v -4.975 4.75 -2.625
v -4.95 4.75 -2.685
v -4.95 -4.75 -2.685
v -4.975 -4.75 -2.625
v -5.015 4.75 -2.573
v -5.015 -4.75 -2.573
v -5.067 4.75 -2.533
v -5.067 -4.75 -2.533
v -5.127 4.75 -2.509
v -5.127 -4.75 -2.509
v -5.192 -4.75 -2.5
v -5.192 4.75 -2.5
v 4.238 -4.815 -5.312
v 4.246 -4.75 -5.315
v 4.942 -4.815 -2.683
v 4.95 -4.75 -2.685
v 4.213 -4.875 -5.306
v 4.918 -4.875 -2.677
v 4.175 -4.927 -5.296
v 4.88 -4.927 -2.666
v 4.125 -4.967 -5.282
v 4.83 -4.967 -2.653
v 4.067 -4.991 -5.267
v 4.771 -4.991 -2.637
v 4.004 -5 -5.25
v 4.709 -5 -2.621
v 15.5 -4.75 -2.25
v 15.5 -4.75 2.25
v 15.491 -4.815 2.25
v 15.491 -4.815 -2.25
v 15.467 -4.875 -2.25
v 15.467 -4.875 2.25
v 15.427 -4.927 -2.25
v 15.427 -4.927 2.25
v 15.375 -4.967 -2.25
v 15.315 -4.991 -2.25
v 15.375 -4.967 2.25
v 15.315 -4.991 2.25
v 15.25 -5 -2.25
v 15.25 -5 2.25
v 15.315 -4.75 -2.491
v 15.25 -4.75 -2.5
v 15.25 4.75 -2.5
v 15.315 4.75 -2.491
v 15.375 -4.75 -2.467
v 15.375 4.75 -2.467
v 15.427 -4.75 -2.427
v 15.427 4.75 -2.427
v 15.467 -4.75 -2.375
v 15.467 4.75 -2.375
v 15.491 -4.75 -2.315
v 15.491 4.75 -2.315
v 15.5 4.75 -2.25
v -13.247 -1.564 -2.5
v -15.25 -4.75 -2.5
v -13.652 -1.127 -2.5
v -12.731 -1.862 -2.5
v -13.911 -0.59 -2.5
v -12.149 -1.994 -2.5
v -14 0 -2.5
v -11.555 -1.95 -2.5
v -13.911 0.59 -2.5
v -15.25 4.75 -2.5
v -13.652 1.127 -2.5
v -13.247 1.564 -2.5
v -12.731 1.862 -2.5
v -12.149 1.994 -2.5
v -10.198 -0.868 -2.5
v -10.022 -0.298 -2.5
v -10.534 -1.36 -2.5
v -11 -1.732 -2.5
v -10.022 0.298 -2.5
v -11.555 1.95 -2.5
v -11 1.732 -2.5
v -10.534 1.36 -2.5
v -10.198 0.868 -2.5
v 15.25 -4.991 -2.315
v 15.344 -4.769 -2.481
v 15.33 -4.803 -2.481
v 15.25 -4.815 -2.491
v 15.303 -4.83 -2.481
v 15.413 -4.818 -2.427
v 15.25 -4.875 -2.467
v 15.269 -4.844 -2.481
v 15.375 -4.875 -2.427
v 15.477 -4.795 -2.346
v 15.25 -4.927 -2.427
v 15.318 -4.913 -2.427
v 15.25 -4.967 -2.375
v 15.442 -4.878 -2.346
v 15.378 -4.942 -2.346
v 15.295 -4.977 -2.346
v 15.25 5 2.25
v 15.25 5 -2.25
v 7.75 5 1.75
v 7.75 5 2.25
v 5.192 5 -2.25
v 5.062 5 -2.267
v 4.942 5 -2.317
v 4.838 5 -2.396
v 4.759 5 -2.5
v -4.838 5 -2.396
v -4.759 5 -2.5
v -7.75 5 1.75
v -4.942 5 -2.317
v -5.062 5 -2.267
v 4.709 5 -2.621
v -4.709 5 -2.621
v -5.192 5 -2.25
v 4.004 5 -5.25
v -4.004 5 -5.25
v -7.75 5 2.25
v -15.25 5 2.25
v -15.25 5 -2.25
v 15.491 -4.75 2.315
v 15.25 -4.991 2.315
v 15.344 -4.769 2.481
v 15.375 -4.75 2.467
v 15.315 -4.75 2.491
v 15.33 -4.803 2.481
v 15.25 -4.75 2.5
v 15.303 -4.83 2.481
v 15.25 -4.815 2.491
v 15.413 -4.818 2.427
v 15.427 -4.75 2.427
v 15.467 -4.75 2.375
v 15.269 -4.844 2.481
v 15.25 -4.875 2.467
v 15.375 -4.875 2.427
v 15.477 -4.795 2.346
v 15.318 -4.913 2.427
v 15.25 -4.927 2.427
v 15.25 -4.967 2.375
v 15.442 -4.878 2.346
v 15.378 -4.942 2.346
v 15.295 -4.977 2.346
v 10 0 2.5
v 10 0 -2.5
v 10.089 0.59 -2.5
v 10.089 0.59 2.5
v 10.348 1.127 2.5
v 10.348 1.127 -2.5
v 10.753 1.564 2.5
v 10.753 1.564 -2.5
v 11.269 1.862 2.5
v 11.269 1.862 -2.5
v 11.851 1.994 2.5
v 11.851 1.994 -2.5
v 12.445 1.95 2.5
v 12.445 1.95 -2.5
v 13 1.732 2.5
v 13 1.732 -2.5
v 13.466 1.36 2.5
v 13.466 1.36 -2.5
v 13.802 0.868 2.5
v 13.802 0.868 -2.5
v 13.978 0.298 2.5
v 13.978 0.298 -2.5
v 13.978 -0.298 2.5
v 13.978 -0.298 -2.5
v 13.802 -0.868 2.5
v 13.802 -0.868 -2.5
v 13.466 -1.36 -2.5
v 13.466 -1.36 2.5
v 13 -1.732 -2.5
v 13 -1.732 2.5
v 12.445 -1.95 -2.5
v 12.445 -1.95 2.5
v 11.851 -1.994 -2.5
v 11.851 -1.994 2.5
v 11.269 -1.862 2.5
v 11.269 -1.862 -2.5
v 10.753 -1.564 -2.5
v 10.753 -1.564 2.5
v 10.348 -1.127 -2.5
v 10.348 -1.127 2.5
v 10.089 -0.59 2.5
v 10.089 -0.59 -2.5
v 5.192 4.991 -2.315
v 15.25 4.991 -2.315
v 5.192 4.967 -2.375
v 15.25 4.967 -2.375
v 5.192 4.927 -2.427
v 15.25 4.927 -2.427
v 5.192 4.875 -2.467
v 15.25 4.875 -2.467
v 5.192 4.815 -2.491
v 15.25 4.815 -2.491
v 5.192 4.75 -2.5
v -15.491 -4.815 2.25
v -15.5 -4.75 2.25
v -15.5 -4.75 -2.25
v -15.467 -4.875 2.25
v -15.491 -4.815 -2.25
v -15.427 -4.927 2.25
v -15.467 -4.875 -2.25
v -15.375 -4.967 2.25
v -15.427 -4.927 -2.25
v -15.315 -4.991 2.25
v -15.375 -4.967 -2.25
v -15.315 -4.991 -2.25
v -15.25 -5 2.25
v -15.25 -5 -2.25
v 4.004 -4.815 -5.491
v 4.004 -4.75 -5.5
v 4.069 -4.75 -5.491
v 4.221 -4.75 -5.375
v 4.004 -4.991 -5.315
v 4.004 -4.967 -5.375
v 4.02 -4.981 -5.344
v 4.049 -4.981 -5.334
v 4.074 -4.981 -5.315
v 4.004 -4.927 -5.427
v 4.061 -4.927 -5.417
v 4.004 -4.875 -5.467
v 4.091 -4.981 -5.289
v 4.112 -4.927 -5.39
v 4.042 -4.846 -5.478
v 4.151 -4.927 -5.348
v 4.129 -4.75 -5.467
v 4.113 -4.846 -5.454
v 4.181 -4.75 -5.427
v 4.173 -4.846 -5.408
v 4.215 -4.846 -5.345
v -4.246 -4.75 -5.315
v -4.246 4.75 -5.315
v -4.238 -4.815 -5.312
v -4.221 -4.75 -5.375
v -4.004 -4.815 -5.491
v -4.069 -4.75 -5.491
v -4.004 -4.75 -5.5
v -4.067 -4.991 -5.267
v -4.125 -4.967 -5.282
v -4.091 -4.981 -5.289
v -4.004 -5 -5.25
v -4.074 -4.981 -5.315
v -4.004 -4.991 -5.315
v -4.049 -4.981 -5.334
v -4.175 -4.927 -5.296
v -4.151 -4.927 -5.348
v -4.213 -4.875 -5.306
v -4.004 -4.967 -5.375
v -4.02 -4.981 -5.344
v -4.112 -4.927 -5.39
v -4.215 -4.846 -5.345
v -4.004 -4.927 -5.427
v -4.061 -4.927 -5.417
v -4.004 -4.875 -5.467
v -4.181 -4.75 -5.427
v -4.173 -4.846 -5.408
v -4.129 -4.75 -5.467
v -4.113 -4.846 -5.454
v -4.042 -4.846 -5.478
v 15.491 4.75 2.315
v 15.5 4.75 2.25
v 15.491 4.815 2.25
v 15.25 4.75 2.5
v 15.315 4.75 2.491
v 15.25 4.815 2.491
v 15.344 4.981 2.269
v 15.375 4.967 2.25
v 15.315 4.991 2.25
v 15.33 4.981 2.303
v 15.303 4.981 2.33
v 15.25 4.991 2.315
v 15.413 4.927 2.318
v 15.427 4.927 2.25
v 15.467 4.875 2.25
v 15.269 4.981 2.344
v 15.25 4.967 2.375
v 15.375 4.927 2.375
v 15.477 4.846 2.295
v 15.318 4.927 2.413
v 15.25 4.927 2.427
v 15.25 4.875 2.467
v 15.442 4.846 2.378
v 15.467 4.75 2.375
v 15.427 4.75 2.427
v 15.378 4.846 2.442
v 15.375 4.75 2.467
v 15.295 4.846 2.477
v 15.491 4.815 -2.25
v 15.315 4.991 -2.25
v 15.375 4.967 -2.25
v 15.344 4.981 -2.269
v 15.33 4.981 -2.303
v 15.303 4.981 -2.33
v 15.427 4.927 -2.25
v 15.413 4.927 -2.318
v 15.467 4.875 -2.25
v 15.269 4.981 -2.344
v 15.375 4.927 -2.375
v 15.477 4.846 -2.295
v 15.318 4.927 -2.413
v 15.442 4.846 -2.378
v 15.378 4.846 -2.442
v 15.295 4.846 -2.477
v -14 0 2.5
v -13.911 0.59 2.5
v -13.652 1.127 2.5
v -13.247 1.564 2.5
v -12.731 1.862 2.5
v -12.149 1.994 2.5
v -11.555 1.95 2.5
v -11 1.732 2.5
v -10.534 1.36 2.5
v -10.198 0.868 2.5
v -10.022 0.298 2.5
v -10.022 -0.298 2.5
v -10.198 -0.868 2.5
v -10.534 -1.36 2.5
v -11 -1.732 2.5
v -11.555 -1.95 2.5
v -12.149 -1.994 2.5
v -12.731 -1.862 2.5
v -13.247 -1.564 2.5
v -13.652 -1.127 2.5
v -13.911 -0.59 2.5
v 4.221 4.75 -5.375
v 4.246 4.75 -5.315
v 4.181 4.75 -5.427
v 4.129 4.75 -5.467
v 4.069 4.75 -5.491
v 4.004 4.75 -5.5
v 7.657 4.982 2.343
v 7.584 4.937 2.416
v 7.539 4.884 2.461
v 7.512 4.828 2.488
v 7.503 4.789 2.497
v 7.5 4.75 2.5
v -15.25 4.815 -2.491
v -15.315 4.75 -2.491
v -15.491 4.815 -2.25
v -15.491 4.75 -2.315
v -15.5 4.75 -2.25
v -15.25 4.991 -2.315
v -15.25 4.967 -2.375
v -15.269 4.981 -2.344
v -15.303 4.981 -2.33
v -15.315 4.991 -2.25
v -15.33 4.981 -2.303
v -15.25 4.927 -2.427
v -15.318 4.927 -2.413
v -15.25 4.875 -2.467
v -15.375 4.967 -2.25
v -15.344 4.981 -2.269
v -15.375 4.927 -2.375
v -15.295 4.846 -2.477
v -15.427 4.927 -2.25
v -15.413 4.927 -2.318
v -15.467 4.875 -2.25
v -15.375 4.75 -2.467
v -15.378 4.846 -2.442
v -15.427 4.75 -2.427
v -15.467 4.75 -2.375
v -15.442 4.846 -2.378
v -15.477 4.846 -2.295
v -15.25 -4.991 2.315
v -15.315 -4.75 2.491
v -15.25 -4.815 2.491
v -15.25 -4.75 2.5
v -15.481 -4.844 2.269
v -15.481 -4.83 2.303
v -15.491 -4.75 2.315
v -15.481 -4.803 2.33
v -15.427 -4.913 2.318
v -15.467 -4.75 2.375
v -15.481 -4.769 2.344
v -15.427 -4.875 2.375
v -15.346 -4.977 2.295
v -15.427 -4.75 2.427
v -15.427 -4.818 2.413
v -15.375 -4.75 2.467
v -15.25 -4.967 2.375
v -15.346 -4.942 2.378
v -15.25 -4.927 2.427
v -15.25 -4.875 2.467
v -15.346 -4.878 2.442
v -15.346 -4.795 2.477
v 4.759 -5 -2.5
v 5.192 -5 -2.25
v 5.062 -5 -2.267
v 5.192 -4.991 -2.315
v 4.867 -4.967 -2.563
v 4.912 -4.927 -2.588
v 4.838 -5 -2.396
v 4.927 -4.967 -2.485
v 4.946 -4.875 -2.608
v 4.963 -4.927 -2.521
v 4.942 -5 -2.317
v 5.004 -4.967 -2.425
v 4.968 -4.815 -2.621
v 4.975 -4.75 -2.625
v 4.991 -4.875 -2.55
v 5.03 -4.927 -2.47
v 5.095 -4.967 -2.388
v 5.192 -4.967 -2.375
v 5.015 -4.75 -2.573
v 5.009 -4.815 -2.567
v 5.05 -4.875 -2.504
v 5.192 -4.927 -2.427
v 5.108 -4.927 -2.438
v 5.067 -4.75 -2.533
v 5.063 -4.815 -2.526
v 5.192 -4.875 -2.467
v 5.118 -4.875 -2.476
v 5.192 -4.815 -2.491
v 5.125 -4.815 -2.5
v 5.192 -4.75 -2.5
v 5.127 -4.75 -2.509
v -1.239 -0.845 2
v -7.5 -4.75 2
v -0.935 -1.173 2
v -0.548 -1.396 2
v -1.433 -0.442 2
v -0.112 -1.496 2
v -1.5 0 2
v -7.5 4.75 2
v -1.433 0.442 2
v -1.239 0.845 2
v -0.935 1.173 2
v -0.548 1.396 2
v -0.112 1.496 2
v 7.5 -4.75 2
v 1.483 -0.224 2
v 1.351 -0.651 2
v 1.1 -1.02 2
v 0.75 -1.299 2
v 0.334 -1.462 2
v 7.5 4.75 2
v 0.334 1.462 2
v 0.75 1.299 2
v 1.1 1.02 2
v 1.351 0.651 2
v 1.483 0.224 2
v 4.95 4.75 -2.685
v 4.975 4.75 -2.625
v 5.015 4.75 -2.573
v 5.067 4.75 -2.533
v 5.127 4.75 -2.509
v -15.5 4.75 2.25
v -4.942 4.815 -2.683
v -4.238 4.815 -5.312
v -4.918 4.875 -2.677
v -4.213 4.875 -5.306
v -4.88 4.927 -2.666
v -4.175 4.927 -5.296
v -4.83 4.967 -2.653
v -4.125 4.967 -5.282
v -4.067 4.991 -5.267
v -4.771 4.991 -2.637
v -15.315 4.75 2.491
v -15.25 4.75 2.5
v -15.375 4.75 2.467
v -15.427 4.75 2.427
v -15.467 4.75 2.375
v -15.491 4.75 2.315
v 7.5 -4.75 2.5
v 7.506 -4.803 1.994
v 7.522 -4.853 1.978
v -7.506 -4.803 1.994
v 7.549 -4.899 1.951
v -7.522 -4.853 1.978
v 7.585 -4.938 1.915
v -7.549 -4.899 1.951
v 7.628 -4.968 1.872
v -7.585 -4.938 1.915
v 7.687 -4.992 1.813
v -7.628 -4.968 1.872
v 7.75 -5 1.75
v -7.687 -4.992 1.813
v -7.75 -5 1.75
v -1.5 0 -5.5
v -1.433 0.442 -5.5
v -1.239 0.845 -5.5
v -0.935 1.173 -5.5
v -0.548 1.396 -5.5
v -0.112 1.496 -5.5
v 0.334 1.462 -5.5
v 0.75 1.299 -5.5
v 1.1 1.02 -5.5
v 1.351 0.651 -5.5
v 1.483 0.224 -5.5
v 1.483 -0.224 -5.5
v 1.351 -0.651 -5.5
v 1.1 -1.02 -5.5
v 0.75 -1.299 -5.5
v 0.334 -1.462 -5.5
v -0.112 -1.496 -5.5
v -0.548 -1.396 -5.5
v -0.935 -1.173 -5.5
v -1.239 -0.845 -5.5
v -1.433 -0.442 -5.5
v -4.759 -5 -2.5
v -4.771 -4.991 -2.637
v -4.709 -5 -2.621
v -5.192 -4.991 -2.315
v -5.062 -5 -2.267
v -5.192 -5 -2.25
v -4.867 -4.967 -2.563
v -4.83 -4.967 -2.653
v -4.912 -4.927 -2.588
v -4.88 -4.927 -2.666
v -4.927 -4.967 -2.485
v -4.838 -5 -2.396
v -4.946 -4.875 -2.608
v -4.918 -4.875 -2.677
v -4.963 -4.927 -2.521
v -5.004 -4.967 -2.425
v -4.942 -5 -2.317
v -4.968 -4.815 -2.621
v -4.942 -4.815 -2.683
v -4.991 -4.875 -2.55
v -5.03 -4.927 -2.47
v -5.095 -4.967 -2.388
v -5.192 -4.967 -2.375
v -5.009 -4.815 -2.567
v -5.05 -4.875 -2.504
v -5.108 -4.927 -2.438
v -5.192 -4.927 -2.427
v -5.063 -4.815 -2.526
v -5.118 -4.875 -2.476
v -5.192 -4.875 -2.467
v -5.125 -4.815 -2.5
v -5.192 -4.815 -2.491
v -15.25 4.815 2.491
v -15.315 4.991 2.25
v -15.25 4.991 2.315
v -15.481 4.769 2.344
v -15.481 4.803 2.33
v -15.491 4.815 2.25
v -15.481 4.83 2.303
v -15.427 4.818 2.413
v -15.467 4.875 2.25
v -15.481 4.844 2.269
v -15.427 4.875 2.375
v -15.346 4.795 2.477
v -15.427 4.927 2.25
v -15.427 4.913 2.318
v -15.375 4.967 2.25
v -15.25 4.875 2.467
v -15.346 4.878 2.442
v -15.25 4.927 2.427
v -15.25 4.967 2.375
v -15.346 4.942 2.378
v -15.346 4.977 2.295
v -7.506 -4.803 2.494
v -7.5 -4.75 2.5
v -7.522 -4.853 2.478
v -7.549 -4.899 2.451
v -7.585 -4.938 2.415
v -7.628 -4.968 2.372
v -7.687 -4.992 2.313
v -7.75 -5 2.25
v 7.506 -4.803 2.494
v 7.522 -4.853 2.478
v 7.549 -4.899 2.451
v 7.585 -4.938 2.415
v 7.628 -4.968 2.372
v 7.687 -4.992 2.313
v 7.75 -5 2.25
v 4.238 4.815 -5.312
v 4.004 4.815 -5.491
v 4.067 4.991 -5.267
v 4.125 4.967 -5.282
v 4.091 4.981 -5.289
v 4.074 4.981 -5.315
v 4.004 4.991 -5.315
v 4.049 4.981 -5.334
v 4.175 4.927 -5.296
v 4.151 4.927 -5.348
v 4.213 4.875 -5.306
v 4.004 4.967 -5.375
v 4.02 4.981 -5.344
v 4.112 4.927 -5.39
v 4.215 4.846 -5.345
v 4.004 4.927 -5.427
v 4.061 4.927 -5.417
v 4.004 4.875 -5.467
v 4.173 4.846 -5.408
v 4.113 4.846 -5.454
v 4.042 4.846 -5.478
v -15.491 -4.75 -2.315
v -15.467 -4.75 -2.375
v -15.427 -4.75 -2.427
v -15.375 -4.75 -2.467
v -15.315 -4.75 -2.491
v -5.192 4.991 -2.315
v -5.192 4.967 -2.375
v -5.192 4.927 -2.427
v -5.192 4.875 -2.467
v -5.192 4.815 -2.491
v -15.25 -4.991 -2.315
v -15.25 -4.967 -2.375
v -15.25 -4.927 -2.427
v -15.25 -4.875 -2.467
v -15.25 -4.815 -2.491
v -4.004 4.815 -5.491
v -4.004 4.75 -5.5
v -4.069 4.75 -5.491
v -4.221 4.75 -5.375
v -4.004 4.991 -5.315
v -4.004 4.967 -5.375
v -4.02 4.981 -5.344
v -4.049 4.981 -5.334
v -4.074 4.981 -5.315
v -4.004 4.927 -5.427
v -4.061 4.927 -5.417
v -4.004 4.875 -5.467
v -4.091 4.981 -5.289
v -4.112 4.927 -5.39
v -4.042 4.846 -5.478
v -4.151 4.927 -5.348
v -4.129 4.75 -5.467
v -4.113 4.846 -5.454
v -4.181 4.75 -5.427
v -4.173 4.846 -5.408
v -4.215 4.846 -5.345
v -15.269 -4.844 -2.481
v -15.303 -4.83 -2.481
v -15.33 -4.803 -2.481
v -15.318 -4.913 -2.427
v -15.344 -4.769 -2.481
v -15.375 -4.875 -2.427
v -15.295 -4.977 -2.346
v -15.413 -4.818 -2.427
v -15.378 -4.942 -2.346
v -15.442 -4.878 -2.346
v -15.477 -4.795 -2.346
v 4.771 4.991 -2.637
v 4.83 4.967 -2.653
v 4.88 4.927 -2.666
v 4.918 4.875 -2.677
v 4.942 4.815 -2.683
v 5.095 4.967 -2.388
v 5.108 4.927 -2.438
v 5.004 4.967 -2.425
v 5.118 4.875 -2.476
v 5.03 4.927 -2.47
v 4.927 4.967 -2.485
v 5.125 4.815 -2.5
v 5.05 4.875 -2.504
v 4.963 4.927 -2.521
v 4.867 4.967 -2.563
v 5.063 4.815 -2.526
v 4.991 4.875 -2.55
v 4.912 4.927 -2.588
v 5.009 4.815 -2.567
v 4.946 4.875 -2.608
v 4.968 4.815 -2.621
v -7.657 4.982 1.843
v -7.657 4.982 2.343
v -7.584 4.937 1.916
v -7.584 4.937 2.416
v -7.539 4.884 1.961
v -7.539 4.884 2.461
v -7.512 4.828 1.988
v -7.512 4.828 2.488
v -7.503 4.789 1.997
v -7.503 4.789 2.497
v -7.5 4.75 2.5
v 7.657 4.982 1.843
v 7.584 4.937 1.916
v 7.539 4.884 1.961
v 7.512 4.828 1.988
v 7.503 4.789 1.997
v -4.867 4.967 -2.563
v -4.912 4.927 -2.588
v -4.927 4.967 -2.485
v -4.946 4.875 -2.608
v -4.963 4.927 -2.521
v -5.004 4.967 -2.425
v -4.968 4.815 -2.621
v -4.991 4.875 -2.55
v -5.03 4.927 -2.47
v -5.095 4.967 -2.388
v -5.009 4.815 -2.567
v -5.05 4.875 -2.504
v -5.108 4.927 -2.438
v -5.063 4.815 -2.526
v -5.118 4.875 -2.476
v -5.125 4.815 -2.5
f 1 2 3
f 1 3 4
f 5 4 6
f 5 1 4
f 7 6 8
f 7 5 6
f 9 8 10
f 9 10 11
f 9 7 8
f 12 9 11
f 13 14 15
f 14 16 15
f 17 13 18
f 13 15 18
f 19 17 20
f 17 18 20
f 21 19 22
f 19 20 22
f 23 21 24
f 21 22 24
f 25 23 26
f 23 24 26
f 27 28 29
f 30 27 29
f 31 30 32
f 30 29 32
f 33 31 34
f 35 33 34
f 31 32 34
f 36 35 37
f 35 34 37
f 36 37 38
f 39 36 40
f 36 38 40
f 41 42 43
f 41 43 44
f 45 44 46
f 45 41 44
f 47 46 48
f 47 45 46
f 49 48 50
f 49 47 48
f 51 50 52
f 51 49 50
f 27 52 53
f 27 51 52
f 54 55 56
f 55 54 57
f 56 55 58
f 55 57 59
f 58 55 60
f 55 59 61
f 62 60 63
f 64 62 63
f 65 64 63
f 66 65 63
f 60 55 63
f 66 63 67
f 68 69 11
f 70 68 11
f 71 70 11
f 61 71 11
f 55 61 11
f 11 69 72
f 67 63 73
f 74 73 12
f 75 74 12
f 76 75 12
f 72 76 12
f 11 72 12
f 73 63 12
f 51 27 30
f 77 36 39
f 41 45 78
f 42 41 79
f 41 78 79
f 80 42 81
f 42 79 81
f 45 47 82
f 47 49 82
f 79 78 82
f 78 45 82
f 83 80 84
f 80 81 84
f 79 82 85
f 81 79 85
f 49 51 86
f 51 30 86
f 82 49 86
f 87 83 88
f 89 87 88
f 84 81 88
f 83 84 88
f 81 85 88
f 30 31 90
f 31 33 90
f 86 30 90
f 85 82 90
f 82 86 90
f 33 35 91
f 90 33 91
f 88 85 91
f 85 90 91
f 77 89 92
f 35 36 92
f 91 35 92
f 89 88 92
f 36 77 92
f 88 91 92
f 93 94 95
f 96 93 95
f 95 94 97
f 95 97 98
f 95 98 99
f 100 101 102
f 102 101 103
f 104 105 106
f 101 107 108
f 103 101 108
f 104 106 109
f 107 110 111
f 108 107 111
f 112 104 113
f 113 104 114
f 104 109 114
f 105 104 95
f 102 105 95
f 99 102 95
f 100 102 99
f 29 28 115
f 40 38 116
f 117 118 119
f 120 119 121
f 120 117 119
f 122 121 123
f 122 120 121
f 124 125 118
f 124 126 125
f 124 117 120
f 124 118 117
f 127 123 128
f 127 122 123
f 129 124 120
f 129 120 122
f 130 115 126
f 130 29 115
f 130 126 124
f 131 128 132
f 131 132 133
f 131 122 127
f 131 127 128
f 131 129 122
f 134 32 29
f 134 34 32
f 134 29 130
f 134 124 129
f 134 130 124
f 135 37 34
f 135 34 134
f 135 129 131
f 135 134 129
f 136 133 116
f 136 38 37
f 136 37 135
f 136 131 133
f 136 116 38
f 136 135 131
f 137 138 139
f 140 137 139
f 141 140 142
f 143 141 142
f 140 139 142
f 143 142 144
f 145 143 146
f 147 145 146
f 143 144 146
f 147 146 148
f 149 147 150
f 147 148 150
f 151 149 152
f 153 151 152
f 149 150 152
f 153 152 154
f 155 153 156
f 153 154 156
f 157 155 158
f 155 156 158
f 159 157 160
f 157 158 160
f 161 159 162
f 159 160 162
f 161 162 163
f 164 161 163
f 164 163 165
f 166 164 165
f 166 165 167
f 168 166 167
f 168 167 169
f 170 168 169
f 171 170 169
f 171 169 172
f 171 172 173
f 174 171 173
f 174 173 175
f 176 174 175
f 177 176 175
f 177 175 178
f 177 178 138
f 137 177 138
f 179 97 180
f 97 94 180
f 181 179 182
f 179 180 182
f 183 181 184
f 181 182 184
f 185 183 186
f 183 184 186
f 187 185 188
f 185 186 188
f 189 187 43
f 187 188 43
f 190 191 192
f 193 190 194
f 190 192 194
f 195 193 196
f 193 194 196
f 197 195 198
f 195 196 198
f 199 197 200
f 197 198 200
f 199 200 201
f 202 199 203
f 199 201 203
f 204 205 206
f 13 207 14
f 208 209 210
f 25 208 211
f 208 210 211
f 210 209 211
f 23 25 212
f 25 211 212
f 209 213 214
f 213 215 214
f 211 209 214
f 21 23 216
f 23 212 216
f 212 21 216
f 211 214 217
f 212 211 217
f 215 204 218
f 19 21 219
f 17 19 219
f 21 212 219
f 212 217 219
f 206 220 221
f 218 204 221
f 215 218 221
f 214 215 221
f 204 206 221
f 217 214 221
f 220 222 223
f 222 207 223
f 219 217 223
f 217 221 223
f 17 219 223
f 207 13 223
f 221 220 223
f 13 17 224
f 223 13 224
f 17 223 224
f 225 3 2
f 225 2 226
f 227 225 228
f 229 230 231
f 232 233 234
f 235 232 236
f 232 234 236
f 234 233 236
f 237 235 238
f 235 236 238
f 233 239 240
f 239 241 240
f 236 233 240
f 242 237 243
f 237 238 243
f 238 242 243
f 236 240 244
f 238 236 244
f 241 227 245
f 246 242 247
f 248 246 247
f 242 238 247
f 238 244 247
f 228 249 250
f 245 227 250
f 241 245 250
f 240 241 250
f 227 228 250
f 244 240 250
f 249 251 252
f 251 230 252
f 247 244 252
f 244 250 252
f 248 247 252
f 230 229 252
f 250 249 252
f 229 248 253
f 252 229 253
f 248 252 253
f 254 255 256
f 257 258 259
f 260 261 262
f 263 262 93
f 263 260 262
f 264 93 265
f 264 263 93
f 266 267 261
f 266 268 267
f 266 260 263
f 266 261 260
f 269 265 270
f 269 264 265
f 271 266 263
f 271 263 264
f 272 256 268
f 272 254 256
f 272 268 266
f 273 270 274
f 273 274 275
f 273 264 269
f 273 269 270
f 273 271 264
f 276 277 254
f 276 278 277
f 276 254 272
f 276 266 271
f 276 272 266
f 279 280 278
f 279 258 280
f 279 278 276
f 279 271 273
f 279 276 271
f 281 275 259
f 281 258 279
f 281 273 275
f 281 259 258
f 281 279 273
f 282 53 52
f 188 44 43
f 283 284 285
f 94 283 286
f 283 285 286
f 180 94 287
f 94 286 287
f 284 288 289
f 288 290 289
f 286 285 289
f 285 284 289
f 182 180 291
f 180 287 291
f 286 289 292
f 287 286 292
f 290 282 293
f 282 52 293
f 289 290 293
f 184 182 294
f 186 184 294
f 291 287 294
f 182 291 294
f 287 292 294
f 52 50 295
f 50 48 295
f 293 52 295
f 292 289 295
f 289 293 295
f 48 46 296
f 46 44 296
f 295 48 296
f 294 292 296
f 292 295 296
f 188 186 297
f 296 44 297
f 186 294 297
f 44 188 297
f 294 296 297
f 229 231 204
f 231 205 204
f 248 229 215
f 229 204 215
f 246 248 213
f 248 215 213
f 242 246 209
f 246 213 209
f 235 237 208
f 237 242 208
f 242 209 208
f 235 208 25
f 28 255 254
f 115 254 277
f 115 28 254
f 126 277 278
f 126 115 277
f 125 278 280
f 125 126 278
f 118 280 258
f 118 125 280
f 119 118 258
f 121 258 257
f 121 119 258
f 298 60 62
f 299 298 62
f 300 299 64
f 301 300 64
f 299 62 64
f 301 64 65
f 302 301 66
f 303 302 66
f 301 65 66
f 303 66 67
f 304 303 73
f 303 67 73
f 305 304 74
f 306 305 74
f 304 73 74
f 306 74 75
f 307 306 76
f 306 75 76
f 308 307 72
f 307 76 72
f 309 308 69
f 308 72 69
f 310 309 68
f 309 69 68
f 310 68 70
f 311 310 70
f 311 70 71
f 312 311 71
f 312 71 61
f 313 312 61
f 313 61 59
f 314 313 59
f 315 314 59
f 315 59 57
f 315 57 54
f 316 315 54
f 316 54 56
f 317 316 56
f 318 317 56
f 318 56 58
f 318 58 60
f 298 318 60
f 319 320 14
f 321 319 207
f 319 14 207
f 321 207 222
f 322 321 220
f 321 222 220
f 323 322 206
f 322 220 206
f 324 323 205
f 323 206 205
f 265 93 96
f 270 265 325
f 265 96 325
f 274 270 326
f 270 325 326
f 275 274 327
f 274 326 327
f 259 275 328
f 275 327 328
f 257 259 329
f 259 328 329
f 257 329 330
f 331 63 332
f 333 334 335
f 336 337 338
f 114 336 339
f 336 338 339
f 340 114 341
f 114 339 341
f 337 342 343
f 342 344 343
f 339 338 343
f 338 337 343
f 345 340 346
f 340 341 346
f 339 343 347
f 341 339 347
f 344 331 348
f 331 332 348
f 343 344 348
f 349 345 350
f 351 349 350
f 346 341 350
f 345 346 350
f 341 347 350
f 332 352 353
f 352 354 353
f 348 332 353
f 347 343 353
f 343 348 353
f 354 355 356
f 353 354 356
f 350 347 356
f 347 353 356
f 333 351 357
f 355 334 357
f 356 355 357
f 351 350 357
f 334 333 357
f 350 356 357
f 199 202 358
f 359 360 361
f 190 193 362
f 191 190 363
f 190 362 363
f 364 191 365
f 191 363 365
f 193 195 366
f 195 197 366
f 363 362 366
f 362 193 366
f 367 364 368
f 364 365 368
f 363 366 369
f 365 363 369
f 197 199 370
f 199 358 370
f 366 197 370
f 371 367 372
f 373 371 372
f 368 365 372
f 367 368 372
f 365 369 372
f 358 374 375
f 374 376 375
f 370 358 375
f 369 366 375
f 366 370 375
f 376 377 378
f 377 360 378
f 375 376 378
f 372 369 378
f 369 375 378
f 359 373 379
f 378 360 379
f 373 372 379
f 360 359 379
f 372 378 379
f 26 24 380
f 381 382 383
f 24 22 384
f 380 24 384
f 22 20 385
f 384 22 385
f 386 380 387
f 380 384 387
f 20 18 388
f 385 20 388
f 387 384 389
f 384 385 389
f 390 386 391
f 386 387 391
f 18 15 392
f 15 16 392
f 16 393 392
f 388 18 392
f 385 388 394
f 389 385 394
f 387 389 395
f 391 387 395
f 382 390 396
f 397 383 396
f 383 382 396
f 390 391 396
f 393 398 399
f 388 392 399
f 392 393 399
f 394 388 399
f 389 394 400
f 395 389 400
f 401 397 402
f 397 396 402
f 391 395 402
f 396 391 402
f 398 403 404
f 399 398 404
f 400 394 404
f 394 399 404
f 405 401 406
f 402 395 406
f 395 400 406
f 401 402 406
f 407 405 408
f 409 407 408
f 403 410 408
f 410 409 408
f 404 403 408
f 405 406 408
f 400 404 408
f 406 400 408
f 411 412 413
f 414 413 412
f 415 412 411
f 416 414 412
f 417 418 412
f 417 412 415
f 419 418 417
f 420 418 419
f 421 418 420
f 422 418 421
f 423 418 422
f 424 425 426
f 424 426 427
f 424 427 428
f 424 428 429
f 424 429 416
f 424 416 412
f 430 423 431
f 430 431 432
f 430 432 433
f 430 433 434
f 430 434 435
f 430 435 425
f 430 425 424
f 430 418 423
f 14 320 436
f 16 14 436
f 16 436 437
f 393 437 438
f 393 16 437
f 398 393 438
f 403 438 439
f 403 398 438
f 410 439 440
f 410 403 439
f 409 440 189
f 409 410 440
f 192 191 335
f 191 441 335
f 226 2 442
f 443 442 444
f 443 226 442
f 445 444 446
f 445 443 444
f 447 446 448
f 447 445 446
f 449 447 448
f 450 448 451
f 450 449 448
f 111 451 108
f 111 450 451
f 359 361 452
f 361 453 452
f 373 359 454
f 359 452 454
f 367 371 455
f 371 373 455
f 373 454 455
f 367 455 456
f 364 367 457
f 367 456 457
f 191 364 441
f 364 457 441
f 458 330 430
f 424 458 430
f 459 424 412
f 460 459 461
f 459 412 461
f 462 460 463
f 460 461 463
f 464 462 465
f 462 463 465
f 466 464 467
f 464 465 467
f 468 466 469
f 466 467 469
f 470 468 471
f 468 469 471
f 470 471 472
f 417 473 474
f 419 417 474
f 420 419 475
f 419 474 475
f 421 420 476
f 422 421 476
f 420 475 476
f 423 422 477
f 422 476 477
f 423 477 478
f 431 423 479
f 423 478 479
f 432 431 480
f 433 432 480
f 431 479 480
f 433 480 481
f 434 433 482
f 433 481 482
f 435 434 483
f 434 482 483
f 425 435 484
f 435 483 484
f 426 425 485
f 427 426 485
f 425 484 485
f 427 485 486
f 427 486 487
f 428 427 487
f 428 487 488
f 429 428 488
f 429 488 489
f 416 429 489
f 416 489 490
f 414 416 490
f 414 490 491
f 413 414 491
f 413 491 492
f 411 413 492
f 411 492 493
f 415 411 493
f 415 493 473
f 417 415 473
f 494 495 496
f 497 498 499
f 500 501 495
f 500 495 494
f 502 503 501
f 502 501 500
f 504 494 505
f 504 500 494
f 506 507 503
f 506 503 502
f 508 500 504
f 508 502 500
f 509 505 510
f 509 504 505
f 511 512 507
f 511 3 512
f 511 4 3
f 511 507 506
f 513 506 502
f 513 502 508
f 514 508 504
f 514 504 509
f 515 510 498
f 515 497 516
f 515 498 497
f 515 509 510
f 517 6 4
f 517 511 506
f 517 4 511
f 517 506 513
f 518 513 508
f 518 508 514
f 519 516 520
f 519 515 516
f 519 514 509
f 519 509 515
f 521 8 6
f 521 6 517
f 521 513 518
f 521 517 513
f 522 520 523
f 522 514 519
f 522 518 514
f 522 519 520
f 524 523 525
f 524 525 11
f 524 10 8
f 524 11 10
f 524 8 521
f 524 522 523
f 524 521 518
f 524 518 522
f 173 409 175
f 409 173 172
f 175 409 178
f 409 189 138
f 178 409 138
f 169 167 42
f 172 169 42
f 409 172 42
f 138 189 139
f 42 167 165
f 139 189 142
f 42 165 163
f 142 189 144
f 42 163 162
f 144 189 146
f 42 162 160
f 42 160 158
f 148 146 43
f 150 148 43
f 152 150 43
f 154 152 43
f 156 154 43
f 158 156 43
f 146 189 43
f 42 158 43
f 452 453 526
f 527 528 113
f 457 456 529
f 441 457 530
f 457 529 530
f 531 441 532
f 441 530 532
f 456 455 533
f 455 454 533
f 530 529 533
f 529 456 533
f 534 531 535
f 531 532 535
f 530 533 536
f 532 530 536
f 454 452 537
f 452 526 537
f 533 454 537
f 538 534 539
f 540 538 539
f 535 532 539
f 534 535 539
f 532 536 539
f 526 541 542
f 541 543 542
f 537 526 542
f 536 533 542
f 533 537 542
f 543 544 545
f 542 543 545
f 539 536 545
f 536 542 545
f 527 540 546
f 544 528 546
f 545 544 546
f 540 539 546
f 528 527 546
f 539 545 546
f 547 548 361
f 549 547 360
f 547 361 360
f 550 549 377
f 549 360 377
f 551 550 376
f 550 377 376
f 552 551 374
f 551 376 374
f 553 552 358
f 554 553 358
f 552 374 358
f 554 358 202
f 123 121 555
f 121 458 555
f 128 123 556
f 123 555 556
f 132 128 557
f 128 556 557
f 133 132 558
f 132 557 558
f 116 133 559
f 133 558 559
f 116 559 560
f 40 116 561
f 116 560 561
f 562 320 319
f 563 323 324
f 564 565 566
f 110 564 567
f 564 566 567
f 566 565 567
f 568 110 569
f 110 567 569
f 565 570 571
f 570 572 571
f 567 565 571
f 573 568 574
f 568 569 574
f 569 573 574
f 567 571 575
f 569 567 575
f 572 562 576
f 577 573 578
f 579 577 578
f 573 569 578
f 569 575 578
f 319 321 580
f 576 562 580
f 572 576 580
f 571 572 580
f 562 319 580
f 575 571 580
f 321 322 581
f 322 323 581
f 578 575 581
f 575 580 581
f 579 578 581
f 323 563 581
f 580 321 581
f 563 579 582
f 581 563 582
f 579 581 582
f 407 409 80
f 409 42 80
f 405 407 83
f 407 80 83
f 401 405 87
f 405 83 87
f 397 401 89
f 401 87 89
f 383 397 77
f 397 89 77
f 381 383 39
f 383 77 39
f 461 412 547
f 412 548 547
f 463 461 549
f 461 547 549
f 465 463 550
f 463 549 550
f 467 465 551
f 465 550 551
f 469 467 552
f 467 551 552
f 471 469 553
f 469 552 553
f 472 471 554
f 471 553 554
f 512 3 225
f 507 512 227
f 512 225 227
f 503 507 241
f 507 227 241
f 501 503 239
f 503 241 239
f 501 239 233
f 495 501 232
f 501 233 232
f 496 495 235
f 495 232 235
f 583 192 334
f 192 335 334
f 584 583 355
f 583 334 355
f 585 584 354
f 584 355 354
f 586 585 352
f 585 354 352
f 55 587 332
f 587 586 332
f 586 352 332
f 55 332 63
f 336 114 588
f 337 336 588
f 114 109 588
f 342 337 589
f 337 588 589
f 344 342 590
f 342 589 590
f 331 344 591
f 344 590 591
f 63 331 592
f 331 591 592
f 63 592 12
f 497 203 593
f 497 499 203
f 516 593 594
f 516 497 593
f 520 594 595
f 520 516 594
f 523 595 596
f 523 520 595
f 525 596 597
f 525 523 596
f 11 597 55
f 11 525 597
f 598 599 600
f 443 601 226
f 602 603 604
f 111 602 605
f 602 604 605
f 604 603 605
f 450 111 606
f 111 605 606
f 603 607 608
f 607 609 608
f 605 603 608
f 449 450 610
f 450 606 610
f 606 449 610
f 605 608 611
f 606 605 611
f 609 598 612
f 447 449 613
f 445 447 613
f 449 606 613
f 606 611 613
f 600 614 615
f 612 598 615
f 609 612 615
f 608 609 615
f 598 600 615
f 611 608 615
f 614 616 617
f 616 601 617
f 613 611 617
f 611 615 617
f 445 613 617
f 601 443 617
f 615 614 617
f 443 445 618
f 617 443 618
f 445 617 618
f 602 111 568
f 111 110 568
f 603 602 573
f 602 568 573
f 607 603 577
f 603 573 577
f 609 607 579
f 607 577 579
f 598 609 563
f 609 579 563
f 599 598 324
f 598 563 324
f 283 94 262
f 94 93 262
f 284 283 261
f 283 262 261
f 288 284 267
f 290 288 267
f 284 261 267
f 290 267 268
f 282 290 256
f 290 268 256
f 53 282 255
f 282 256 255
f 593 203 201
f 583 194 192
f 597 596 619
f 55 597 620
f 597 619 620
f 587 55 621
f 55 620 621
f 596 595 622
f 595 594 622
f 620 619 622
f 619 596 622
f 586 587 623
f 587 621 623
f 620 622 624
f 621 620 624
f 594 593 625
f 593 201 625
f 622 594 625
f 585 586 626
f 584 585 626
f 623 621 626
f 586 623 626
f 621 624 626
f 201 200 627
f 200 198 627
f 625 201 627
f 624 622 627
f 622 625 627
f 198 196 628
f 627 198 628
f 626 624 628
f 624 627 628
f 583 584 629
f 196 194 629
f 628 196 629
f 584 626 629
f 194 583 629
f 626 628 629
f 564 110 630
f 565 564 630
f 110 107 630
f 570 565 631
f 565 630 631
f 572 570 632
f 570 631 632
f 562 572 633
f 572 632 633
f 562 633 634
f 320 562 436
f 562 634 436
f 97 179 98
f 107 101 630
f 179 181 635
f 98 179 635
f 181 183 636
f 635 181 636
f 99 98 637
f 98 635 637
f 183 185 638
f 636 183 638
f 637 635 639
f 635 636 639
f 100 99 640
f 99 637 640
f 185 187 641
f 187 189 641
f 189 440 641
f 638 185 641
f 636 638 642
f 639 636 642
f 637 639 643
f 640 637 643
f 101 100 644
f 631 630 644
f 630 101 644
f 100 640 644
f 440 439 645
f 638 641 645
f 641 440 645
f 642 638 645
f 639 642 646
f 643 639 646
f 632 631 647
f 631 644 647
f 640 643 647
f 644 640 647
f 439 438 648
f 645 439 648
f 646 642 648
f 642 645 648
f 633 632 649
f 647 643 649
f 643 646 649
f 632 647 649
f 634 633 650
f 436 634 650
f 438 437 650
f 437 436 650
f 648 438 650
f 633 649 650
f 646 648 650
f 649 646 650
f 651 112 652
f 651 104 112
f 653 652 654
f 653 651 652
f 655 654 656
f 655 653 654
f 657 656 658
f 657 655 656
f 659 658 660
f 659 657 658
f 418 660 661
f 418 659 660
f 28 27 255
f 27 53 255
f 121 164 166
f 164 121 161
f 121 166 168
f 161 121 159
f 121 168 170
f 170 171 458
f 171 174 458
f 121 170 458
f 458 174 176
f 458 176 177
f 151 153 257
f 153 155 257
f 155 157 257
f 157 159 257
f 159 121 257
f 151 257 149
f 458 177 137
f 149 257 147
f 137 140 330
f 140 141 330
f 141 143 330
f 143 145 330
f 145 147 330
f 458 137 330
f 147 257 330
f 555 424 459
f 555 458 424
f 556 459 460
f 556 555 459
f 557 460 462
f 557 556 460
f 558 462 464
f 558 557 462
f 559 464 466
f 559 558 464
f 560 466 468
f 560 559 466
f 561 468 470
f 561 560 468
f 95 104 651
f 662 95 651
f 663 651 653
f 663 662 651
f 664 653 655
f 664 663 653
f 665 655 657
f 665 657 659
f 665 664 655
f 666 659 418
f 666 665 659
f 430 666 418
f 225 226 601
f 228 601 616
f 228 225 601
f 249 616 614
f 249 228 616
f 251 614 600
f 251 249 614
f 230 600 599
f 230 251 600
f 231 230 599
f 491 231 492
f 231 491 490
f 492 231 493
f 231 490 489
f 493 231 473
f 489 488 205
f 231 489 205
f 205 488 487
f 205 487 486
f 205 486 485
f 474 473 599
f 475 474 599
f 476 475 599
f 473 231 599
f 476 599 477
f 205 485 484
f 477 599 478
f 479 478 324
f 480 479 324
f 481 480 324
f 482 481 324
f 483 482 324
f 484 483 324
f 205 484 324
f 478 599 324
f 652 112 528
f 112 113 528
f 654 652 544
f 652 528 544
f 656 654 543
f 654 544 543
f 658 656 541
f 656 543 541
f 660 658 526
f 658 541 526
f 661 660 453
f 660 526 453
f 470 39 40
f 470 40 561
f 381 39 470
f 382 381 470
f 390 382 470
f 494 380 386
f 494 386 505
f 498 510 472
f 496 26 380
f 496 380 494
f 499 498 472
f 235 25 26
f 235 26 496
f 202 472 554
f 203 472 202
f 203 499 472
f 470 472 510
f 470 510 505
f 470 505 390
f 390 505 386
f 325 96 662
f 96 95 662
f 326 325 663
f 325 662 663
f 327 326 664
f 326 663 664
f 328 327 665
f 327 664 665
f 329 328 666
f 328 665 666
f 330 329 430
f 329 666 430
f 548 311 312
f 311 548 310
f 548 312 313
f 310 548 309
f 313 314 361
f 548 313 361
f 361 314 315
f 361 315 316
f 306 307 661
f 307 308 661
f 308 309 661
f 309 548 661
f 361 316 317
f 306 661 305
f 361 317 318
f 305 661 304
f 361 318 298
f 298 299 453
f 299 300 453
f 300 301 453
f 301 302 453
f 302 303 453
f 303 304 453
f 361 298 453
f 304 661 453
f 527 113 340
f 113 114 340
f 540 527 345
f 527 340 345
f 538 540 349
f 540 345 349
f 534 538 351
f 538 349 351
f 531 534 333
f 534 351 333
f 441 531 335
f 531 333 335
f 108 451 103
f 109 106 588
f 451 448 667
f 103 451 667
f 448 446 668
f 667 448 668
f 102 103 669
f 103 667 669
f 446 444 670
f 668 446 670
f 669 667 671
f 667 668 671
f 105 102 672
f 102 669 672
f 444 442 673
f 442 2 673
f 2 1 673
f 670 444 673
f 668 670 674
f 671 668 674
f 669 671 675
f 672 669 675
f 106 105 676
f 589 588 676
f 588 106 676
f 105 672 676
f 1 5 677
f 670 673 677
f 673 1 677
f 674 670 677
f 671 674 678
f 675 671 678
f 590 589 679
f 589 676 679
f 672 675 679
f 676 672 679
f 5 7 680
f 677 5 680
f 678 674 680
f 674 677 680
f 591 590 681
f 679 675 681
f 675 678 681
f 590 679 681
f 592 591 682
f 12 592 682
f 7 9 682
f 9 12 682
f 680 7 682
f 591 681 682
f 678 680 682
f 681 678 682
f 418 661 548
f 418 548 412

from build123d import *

# Parameters (mm, degrees)
BOSS_EXTRUDE1_DEPTH = 5
SKETCH2_W           = 15
SKETCH2_H           = 0.5
CUT_EXTRUDE1_DEPTH  = 20.248376555
SKETCH3_R           = 1.5
SKETCH3_R_2         = 2
CUT_EXTRUDE2_DEPTH  = 18.036725037
SKETCH4_R           = 1.5
CUT_EXTRUDE3_DEPTH  = 19.145247312
FILLET1_R           = 0.25


with BuildPart() as part:
    # Sketch1 → Boss-Extrude1 (new, symmetric)
    with BuildSketch(Plane(origin=(0, 0, 0), x_dir=(1, 0, 0), z_dir=(0, 1, 0))):
        Polygon((-5, 2.5), (-4.196152423, 5.5), (4.196152423, 5.5), (5, 2.5), (15.5, 2.5), (15.5, -2.5), (-15.5, -2.5), (-15.5, 2.5), align=None)
    extrude(amount=BOSS_EXTRUDE1_DEPTH, both=True)

    # Sketch2 → Cut-Extrude1 (cut, through all)
    with BuildSketch(Plane(origin=(0, 5, 0), x_dir=(1, 0, 0), z_dir=(0, 1, 0))):
        with Locations((0, -2.25)):
            Rectangle(SKETCH2_W, SKETCH2_H)
    extrude(amount=-CUT_EXTRUDE1_DEPTH, mode=Mode.SUBTRACT)

    # Sketch3 → Cut-Extrude2 (cut, through all)
    with BuildSketch(Plane(origin=(0, 0, -2.5), x_dir=(-1, 0, 0), z_dir=(0, 0, -1))):
        Circle(SKETCH3_R)
        with Locations((12, 0)):
            Circle(SKETCH3_R_2)
        with Locations((-12, 0)):
            Circle(SKETCH3_R_2)
    extrude(amount=-CUT_EXTRUDE2_DEPTH, mode=Mode.SUBTRACT)

    # Sketch4 → Cut-Extrude3 (cut, through all)
    with BuildSketch(Plane(origin=(0, 0, -5.5), x_dir=(-1, 0, 0), z_dir=(0, 0, -1))):
        Circle(SKETCH4_R)
    extrude(amount=-CUT_EXTRUDE3_DEPTH, mode=Mode.SUBTRACT)

    # Fillet1
    fillet1_edges = [part.edges().sort_by_distance(p)[0] for p in [
        (15.5, -5, 0),
        (-11.5, -5, 2.5),
        (-15.5, -5, 0),
        (-10.25, -5, -2.5),
        (-11.5, 5, 2.5),
        (-5, 0, -2.5),
        (-4.196152423, 0, -5.5),
        (4.196152423, 0, -5.5),
        (5, 0, -2.5),
        (15.5, 0, -2.5),
        (15.5, 0, 2.5),
        (-15.5, 0, 2.5),
        (-15.5, 0, -2.5),
        (15.5, 5, 0),
        (10.25, 5, -2.5),
        (4.598076211, 5, -4),
        (11.5, -5, 2.5),
        (11.5, 5, 2.5),
        (0, 5, -5.5),
        (-7.5, -5, 2.25),
        (0, -5, 2),
        (7.5, -5, 2.25),
        (-7.5, 5, 2.25),
        (-4.598076211, 5, -4),
        (7.5, 5, 2.25),
        (0, 5, 2),
        (-10.25, 5, -2.5),
        (-4.598076211, -5, -4),
        (-15.5, 5, 0),
        (0, -5, -5.5),
        (4.598076211, -5, -4),
        (10.25, -5, -2.5),
    ]]
    fillet(fillet1_edges, radius=FILLET1_R)


solid = part.part
